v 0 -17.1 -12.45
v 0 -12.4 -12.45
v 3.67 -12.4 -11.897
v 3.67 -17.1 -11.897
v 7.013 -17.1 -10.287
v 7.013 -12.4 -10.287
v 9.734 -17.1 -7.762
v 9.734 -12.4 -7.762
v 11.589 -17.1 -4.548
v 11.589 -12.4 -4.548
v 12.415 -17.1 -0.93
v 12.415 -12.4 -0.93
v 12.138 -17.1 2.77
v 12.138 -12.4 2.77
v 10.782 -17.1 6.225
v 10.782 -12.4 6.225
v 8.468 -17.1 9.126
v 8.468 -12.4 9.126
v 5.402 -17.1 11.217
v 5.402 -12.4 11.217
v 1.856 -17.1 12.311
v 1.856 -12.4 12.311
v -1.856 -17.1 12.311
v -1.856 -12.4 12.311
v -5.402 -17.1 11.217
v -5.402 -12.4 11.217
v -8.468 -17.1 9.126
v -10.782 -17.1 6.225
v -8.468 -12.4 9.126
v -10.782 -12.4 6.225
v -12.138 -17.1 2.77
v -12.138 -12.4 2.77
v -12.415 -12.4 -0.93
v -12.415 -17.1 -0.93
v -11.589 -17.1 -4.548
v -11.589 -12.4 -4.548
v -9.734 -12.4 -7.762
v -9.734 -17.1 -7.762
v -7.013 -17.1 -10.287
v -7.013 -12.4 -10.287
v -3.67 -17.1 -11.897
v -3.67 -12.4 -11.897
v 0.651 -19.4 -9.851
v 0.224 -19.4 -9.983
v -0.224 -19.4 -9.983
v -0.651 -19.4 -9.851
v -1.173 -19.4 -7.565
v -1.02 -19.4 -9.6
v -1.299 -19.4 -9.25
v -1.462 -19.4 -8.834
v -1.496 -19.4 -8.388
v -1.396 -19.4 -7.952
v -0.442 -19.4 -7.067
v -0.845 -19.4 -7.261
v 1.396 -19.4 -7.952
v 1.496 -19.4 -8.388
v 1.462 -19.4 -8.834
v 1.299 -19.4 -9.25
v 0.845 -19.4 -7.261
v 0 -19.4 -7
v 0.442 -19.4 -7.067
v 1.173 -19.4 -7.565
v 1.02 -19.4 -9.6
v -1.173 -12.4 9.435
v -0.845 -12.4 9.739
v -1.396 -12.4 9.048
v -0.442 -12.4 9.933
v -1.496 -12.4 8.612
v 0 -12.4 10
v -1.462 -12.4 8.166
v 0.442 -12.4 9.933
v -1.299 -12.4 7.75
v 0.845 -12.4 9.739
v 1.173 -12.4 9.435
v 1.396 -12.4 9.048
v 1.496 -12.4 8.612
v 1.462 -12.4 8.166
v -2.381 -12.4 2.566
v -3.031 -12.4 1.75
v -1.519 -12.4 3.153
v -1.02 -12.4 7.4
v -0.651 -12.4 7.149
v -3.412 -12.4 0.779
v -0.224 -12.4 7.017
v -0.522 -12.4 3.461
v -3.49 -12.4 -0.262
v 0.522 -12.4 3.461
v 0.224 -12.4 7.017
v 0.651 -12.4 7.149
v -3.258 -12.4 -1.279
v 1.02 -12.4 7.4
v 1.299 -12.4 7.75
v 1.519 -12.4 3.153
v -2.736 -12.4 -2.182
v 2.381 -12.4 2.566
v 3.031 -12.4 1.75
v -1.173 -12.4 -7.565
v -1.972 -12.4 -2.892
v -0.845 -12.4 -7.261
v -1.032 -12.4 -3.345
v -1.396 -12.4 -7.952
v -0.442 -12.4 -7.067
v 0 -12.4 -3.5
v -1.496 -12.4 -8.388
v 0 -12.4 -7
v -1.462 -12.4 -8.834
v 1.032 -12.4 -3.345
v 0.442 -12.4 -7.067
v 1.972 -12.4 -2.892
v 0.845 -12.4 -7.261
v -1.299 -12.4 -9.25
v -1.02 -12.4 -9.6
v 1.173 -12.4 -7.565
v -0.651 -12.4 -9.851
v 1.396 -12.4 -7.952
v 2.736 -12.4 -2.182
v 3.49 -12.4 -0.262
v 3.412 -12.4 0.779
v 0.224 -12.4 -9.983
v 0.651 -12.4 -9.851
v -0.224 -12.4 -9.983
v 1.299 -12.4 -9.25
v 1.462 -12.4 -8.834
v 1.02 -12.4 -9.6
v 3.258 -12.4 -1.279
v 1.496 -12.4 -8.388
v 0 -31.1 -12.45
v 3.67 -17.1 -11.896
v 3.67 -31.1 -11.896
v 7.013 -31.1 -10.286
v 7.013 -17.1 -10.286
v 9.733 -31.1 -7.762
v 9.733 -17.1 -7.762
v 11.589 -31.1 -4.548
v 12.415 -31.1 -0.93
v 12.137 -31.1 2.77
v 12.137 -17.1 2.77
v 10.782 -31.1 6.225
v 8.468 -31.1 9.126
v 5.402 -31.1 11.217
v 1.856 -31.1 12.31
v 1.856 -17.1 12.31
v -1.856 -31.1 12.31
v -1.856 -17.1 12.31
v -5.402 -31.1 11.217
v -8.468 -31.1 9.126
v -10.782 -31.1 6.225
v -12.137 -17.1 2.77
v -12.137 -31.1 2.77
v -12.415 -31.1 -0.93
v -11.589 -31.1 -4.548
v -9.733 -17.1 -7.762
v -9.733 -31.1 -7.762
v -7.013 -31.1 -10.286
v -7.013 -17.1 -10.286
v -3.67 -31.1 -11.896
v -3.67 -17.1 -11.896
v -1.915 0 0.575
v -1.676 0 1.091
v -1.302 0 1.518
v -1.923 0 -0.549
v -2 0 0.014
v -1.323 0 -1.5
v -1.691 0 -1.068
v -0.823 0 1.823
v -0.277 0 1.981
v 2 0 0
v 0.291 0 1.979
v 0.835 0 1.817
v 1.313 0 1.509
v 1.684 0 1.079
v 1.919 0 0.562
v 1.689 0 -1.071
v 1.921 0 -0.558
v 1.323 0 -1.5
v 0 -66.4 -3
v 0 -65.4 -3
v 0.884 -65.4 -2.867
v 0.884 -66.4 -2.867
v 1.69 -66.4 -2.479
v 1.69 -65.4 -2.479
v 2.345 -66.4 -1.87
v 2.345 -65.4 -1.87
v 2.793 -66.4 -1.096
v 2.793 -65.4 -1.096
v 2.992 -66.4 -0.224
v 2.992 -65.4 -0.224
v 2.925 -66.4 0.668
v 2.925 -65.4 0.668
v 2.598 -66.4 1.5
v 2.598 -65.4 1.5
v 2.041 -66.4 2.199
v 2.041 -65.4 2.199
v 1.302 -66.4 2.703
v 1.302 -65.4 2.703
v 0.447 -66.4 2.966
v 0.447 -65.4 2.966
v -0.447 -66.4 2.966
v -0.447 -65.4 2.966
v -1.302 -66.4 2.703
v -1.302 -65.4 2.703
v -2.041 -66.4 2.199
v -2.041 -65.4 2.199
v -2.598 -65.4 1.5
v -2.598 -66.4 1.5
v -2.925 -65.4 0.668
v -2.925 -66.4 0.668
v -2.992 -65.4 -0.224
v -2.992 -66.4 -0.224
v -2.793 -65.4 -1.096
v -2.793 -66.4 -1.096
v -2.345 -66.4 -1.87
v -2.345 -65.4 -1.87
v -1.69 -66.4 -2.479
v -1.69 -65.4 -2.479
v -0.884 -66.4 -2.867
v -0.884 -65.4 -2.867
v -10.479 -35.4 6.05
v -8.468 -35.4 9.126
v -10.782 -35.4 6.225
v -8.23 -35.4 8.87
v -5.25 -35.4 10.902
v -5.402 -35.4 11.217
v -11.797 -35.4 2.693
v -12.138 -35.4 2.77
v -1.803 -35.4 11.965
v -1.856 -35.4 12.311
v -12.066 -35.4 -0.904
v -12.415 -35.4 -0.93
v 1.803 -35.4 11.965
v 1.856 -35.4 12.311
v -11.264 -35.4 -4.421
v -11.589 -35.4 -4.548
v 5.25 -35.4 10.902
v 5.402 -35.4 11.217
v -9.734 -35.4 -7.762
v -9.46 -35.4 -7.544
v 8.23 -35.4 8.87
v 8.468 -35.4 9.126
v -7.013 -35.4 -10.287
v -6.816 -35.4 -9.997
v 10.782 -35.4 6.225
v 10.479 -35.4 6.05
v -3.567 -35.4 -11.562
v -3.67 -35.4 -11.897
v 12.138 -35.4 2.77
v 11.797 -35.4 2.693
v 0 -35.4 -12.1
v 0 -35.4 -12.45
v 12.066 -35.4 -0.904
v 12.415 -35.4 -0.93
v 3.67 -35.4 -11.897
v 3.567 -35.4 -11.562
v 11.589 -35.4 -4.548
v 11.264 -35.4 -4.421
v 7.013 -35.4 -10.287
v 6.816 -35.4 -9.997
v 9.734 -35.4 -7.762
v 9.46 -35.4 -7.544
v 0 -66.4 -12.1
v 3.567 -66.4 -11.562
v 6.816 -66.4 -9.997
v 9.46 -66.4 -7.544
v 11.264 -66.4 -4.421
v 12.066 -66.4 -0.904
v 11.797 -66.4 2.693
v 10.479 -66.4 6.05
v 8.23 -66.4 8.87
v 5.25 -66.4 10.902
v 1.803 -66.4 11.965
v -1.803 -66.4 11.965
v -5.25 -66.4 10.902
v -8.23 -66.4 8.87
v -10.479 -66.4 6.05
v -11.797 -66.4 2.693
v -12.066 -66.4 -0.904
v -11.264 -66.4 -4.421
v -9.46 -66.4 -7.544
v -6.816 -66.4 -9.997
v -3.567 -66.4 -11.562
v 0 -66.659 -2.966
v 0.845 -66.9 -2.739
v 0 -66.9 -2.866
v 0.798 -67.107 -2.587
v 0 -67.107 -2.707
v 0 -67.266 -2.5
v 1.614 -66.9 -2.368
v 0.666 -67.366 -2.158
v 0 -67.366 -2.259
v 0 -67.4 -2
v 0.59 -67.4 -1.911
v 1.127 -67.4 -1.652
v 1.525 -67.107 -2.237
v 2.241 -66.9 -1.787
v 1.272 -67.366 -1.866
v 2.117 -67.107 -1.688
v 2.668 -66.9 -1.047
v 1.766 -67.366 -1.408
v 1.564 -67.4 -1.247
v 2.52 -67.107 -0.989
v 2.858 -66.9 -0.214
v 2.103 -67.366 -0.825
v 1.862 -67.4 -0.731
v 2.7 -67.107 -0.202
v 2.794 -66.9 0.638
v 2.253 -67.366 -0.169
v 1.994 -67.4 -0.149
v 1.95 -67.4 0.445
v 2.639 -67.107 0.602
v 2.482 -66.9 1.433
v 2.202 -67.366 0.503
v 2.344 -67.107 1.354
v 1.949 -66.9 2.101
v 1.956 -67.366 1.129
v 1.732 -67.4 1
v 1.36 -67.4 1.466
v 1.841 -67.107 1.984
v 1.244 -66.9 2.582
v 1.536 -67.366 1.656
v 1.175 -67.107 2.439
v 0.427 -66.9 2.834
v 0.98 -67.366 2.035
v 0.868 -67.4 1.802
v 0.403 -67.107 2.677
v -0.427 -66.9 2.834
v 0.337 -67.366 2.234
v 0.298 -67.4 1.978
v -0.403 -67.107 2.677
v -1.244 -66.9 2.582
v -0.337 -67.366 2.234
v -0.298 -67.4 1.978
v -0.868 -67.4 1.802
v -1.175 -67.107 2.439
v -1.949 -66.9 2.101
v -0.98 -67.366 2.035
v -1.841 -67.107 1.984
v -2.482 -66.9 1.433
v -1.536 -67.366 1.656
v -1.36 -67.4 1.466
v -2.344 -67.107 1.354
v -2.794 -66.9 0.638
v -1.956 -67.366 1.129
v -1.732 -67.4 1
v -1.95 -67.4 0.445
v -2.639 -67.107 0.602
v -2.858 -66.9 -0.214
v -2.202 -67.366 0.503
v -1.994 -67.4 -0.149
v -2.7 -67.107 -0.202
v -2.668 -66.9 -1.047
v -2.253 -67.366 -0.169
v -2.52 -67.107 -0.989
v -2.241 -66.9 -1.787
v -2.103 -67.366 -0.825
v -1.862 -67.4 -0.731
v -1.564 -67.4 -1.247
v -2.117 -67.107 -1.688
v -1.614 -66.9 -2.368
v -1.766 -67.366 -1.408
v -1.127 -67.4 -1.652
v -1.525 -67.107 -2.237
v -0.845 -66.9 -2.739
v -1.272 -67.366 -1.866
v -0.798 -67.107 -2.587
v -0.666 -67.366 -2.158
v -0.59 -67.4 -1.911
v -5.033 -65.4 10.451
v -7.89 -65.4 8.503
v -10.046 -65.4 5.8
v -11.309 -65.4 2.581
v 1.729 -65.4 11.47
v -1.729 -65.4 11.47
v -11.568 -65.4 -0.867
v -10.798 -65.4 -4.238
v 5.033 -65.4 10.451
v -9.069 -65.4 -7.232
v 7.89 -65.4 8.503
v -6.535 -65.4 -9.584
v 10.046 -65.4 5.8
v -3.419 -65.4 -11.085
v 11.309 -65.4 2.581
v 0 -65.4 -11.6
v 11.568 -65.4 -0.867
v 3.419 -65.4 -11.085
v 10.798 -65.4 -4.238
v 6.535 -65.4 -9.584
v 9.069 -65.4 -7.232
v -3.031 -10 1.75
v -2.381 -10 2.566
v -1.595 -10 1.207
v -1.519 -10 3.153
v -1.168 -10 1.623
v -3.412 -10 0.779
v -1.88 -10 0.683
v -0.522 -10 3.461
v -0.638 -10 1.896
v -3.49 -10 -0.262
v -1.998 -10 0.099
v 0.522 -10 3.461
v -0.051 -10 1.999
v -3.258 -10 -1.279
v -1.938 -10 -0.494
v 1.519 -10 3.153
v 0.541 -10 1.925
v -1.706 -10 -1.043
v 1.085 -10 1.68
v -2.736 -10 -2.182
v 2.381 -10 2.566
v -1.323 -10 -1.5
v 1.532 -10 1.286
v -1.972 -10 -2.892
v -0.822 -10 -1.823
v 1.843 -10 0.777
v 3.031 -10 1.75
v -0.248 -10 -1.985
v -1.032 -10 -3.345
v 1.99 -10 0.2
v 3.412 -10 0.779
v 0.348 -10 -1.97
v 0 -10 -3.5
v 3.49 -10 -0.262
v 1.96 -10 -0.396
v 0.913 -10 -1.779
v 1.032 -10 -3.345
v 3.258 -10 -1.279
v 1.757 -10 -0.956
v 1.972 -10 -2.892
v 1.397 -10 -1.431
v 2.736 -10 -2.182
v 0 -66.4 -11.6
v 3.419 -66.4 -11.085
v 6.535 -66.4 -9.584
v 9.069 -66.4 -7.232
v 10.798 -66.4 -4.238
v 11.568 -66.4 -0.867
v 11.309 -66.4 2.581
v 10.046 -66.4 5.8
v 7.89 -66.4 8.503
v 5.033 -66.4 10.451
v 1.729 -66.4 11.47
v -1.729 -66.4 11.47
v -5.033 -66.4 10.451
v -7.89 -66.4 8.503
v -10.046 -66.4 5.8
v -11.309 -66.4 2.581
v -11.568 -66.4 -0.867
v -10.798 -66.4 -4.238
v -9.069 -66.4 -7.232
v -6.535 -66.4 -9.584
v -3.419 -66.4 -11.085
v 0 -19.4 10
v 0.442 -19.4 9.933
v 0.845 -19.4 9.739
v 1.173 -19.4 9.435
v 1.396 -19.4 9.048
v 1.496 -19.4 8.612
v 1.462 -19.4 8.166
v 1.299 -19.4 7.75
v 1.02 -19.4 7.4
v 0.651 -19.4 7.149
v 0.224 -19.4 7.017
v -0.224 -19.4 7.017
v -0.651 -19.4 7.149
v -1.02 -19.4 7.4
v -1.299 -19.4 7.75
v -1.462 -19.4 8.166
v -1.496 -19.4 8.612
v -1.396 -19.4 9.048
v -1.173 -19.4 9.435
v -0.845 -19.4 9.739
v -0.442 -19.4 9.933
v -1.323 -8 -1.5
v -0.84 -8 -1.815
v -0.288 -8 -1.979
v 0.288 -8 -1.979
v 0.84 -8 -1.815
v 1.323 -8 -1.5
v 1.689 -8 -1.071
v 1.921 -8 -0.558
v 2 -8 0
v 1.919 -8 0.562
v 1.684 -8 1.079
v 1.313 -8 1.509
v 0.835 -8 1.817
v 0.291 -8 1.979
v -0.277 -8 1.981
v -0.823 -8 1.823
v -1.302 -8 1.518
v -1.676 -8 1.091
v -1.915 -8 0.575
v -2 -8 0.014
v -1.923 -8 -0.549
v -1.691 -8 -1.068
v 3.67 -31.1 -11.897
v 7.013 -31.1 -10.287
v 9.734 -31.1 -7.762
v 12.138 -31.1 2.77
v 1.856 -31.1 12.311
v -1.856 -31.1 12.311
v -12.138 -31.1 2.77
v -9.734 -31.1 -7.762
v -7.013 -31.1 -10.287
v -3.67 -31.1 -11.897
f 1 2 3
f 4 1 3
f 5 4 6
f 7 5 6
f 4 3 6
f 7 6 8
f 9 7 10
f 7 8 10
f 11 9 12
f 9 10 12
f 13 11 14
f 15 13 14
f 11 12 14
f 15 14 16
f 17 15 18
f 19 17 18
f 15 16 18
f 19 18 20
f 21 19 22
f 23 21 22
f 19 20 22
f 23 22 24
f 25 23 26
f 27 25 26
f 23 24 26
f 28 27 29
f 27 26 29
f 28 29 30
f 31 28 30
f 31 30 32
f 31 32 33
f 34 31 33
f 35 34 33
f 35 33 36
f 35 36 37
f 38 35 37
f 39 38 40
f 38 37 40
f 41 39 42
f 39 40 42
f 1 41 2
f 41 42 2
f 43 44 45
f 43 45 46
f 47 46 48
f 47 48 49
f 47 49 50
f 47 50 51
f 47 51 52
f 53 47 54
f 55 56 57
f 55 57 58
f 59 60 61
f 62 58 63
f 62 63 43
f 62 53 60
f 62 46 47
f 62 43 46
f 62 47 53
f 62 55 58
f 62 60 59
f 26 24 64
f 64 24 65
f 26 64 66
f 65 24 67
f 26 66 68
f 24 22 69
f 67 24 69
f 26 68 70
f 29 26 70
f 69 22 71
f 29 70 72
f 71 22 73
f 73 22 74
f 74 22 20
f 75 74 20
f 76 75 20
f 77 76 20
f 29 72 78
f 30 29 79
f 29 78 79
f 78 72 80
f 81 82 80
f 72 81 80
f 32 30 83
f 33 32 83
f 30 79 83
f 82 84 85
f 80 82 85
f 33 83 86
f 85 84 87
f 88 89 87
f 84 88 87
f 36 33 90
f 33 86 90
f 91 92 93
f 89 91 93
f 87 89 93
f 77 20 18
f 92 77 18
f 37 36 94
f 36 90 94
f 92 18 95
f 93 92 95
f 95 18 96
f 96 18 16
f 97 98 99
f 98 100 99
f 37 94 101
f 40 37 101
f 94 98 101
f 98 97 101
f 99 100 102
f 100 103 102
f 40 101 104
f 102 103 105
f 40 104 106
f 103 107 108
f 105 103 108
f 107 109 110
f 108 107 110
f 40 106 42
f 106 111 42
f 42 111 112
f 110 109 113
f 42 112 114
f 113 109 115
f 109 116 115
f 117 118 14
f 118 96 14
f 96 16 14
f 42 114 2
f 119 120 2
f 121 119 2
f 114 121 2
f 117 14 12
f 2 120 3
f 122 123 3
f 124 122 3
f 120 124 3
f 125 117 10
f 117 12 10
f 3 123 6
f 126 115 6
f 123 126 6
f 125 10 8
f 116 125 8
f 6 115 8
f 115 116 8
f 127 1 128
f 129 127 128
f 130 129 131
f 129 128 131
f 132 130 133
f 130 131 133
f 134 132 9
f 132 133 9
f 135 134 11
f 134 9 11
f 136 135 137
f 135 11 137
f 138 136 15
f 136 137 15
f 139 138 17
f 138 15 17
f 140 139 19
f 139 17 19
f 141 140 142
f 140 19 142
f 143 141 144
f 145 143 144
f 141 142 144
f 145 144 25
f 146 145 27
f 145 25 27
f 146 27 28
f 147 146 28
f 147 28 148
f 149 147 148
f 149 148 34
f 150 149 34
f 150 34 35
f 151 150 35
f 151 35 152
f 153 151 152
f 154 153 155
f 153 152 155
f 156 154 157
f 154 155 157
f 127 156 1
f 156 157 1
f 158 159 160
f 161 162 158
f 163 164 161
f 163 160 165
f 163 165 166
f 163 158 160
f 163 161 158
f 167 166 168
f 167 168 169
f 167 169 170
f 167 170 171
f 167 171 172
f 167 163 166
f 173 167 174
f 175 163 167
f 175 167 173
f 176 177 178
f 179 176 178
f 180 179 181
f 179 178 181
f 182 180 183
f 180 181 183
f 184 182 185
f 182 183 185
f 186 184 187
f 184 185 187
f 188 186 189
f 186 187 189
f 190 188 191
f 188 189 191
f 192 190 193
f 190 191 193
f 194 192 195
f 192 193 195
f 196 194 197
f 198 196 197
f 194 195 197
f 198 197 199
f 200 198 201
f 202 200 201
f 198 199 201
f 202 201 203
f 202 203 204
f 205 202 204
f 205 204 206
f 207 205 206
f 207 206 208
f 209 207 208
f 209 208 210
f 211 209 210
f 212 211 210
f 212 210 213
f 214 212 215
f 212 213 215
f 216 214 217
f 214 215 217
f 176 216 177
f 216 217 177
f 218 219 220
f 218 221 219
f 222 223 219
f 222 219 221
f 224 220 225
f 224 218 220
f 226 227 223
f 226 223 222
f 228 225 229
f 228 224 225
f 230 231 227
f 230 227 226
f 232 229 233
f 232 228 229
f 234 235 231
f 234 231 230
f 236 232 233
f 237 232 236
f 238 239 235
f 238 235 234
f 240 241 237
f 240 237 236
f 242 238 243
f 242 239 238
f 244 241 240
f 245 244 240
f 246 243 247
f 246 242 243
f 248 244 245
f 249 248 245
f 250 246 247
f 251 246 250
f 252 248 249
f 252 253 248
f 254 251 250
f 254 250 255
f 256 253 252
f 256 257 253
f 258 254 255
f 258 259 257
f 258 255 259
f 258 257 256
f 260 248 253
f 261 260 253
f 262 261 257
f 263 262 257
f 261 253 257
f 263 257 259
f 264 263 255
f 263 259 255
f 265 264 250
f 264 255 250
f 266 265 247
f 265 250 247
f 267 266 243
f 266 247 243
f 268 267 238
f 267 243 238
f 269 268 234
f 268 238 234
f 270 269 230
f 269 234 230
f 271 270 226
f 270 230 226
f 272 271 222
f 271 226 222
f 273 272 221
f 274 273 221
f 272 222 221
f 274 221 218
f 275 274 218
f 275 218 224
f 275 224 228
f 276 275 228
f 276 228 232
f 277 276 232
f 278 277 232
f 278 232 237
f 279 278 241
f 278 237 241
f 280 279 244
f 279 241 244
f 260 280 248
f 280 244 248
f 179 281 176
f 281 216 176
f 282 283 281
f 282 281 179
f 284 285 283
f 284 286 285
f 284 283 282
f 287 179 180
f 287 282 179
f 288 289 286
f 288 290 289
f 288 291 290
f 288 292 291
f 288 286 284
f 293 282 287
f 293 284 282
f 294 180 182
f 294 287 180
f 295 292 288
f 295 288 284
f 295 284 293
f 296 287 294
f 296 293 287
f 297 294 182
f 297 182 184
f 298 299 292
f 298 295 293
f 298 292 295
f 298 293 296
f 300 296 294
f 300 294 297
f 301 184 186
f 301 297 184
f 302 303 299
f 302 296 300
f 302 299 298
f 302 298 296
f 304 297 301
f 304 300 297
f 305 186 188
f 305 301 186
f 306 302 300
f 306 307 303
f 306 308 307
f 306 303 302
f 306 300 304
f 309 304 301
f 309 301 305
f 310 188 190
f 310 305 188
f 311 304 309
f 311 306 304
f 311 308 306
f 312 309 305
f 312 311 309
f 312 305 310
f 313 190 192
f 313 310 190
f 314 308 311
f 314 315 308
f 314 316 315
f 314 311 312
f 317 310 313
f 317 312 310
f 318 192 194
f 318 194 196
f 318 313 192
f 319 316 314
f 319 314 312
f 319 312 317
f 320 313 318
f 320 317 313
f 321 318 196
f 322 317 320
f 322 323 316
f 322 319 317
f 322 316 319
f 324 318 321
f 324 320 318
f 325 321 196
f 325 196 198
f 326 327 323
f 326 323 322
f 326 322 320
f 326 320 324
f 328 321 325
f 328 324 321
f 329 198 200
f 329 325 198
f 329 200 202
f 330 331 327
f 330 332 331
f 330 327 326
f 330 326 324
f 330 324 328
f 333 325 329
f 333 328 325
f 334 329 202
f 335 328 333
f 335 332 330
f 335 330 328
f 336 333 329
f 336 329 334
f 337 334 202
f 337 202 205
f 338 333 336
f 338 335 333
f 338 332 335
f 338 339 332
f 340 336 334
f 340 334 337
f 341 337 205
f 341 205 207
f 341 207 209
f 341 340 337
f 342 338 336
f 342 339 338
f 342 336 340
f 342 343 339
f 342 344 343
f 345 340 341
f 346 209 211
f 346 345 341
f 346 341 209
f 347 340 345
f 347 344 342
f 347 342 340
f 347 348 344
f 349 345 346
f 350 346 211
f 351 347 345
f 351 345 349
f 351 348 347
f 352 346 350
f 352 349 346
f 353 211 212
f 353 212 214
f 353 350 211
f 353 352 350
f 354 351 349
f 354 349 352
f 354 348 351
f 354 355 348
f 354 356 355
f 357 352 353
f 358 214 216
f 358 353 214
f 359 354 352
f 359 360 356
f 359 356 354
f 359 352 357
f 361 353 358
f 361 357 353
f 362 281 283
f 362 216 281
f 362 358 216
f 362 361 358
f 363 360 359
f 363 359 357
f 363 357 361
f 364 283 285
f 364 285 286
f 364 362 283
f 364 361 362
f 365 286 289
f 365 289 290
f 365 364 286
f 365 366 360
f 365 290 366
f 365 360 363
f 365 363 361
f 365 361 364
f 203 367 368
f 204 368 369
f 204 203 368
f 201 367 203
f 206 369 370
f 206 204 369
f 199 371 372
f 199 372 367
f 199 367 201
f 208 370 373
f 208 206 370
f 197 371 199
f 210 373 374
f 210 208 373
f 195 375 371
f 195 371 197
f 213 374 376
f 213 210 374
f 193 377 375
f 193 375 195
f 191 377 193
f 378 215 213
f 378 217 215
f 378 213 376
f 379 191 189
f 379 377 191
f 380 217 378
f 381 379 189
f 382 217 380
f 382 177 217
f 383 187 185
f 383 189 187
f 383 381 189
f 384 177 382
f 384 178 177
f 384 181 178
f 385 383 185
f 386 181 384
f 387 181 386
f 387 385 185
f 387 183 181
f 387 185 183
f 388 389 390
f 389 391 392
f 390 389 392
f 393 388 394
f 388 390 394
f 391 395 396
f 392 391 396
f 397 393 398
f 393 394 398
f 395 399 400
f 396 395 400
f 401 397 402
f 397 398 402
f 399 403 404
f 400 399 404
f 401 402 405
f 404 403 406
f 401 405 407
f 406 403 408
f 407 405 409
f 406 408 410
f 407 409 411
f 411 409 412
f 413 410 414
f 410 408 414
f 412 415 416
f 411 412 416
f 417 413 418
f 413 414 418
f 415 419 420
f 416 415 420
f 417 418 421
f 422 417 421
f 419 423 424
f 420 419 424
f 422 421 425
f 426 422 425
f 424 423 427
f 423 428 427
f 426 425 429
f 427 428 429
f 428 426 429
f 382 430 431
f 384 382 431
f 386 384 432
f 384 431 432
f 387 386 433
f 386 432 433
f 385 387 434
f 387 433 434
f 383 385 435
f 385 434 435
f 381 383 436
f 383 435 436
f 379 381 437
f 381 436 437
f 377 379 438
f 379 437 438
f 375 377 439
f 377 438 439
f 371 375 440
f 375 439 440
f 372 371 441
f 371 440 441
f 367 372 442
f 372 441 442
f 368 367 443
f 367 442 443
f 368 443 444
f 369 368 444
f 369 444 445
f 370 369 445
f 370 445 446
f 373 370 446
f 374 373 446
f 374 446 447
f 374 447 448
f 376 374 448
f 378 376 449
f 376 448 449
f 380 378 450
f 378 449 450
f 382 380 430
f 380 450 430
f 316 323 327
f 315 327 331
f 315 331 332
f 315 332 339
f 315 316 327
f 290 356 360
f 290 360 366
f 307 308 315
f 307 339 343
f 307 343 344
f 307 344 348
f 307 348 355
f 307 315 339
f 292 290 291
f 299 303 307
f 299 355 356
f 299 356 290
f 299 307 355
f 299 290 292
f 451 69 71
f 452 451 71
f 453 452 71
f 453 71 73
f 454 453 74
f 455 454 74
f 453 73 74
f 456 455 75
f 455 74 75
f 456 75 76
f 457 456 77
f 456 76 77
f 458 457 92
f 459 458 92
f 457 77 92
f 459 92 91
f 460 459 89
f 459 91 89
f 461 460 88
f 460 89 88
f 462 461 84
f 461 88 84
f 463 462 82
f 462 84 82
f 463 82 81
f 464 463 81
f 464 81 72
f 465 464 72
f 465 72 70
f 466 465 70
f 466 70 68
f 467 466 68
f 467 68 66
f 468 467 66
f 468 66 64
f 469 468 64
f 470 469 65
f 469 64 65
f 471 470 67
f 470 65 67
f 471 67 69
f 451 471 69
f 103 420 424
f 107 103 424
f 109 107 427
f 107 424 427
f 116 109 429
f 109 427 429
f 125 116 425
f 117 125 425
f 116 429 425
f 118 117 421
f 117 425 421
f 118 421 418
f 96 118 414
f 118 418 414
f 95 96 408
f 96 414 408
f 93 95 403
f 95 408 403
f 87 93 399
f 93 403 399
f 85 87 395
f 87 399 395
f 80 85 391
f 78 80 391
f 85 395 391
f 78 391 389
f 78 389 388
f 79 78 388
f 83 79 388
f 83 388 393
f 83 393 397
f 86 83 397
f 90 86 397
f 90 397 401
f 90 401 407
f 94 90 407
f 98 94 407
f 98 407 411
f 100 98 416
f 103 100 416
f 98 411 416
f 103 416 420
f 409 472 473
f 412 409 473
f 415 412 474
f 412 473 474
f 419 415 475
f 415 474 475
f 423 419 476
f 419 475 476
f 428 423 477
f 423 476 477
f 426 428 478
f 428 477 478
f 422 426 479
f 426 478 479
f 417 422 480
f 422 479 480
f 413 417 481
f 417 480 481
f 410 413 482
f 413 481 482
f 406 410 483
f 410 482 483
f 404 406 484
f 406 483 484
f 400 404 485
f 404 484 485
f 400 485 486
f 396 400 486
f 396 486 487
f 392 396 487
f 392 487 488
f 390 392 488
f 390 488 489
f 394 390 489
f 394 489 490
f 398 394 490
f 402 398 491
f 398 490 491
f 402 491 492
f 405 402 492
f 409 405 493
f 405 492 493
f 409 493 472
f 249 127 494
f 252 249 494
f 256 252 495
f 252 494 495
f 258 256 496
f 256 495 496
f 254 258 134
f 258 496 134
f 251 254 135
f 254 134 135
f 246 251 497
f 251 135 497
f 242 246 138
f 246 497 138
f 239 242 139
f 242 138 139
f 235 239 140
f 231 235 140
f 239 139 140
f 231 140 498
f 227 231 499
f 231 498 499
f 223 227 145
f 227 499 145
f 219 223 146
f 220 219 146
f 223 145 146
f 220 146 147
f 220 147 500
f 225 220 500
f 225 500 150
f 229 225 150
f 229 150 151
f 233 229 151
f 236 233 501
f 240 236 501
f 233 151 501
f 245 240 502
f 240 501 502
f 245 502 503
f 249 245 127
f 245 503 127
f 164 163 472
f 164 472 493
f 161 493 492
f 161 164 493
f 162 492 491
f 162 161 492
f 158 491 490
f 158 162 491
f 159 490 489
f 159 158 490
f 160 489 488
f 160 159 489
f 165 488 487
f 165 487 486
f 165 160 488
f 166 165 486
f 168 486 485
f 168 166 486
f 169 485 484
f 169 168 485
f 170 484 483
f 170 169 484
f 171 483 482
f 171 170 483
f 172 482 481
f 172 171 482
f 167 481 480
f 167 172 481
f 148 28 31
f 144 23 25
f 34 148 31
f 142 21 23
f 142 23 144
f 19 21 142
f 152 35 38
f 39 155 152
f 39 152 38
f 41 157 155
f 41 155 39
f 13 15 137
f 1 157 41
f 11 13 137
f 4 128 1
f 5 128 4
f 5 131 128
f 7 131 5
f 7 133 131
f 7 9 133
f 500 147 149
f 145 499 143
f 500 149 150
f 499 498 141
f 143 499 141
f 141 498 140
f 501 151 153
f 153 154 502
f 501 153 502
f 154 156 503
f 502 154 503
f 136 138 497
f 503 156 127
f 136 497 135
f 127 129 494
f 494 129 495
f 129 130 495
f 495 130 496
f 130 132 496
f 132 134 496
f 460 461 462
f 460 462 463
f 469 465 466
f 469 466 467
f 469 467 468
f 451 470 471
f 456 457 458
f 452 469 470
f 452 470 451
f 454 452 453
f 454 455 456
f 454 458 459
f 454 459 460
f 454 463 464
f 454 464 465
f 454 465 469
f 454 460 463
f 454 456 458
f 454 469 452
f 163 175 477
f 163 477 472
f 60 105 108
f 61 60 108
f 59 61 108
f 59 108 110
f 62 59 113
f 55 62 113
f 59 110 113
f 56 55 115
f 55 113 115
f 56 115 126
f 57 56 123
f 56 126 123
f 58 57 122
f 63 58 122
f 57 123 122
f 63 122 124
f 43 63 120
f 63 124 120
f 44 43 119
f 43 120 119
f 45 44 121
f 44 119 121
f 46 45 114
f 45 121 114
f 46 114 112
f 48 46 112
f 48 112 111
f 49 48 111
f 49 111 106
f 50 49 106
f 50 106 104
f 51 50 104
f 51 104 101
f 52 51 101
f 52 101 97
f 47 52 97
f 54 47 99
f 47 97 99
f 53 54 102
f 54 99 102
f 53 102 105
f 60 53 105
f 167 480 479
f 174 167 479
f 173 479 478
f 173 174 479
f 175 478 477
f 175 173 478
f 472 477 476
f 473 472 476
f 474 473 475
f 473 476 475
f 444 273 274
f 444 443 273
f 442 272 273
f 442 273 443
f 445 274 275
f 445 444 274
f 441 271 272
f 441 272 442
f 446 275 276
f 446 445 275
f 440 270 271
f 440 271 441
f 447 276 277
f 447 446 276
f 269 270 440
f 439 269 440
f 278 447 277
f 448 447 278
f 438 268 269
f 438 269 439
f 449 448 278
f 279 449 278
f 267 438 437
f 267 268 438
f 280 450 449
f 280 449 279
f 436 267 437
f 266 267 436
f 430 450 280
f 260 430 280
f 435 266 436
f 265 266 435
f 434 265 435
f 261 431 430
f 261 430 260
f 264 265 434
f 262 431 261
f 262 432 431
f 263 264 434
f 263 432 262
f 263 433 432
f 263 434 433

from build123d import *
from build123d.topology import SkipClean

# Parameters (mm, degrees)
EXTRUDE_1_DEPTH     = 8
SKETCH_3_R          = 2
EXTRUDE_2_DEPTH     = 2
SKETCH_4_R          = 3.5
EXTRUDE_3_DEPTH     = 2.4
SKETCH_5_R          = 12.45
EXTRUDE_4_DEPTH     = 4.7
SKETCH_6_R          = 12.4495
EXTRUDE_5_DEPTH     = 14
SKETCH_7_R          = 12.45
EXTRUDE_6_DEPTH     = 4.3
SKETCH_8_R          = 12.1
EXTRUDE_7_DEPTH     = 31
SKETCH_9_R          = 11.6
CUT_EXTRUDE_3_DEPTH = 1
SKETCH_10_R         = 3
EXTRUDE_8_DEPTH     = 2
FILLET_1_R          = 1
SKETCH_11_R         = 1.5
CUT_EXTRUDE_4_DEPTH = 7


with BuildPart() as part:
    # Эскиз2 → Бобышка-Вытянуть1 (new body)
    with BuildSketch(Plane(origin=(0, 0, 0), x_dir=(1, 0, 0), z_dir=(0, 1, 0))):
        with BuildLine():
            Line((1.322875656, 1.5), (-1.322875656, 1.5))
            ThreePointArc((-1.322875656, 1.5), (-0.822875656, -1.822875656), (2, 0))
            ThreePointArc((2, 0), (1.822875656, 0.822875656), (1.322875656, 1.5))
        make_face()
    extrude(amount=-EXTRUDE_1_DEPTH)

    # Эскиз3 → Бобышка-Вытянуть2 (add)
    with BuildSketch(Plane(origin=(0, -8, 0), x_dir=(-1, 0, 0), z_dir=(0, -1, 0))):
        with Locations(Location((0, 0, 0), (0, 0, 48.590377891))):
            Circle(SKETCH_3_R)
    extrude(amount=EXTRUDE_2_DEPTH)

    # Эскиз4 → Бобышка-Вытянуть3 (add)
    with SkipClean():  # the faces are left unmerged after this step: merging them gives an invalid solid
        with BuildSketch(Plane(origin=(0, -10, 0), x_dir=(-1, 0, 0), z_dir=(0, -1, 0))):
            with Locations(Location((0, 0, 0), (0, 0, 90))):
                Circle(SKETCH_4_R)
        extrude(amount=EXTRUDE_3_DEPTH)

    # Эскиз5 → Бобышка-Вытянуть4 (add)
    with SkipClean():  # the faces are left unmerged after this step: merging them gives an invalid solid
        with BuildSketch(Plane(origin=(0, -12.4, 0), x_dir=(-1, 0, 0), z_dir=(0, -1, 0))):
            with Locations(Location((0, 0, 0), (0, 0, 90))):
                Circle(SKETCH_5_R)
        extrude(amount=EXTRUDE_4_DEPTH)

    # Эскиз6 → Бобышка-Вытянуть5 (add)
    with SkipClean():  # the faces are left unmerged after this step: merging them gives an invalid solid
        with BuildSketch(Plane(origin=(0, -17.1, 0), x_dir=(-1, 0, 0), z_dir=(0, -1, 0))):
            with Locations(Location((0, 0, 0), (0, 0, 90))):
                Circle(SKETCH_6_R)
        extrude(amount=EXTRUDE_5_DEPTH)

    # Эскиз7 → Бобышка-Вытянуть6 (add)
    with SkipClean():  # the faces are left unmerged after this step: merging them gives an invalid solid
        with BuildSketch(Plane(origin=(0, -31.1, 0), x_dir=(-1, 0, 0), z_dir=(0, -1, 0))):
            with Locations(Location((0, 0, 0), (0, 0, 90))):
                Circle(SKETCH_7_R)
        extrude(amount=EXTRUDE_6_DEPTH)

    # Эскиз8 → Бобышка-Вытянуть7 (add)
    with SkipClean():  # the faces are left unmerged after this step: merging them gives an invalid solid
        with BuildSketch(Plane(origin=(0, -35.4, 0), x_dir=(-1, 0, 0), z_dir=(0, -1, 0))):
            with Locations(Location((0, 0, 0), (0, 0, 90))):
                Circle(SKETCH_8_R)
        extrude(amount=EXTRUDE_7_DEPTH)

    # Эскиз9 → Вырез-Вытянуть3 (cut)
    with SkipClean():  # the faces are left unmerged after this step: merging them gives an invalid solid
        with BuildSketch(Plane(origin=(0, -66.4, 0), x_dir=(-1, 0, 0), z_dir=(0, -1, 0))):
            with Locations(Location((0, 0, 0), (0, 0, 90))):
                Circle(SKETCH_9_R)
        extrude(amount=-CUT_EXTRUDE_3_DEPTH, mode=Mode.SUBTRACT)

    # Эскиз10 → Бобышка-Вытянуть8 (add)
    with SkipClean():  # the faces are left unmerged after this step: merging them gives an invalid solid
        with BuildSketch(Plane(origin=(0, -65.4, 0), x_dir=(-1, 0, 0), z_dir=(0, -1, 0))):
            with Locations(Location((0, 0, 0), (0, 0, 90))):
                Circle(SKETCH_10_R)
        extrude(amount=EXTRUDE_8_DEPTH)

    # Скругление1
    fillet_1_edges = [part.edges().sort_by_distance(p)[0] for p in [
        (0, -67.4, 3),
    ]]
    fillet(fillet_1_edges, radius=FILLET_1_R)

    # Эскиз11 → Вырез-Вытянуть4 (cut)
    with SkipClean():  # the faces are left unmerged after this step: merging them gives an invalid solid
        with BuildSketch(Plane(origin=(0, -12.4, 0), x_dir=(1, 0, 0), z_dir=(0, 1, 0))):
            with Locations(Location((0, 8.5, 0), (0, 0, 270))):
                Circle(SKETCH_11_R)
            with Locations(Location((0, -8.5, 0), (0, 0, 270))):
                Circle(SKETCH_11_R)
        extrude(amount=-CUT_EXTRUDE_4_DEPTH, mode=Mode.SUBTRACT)


solid = part.part
